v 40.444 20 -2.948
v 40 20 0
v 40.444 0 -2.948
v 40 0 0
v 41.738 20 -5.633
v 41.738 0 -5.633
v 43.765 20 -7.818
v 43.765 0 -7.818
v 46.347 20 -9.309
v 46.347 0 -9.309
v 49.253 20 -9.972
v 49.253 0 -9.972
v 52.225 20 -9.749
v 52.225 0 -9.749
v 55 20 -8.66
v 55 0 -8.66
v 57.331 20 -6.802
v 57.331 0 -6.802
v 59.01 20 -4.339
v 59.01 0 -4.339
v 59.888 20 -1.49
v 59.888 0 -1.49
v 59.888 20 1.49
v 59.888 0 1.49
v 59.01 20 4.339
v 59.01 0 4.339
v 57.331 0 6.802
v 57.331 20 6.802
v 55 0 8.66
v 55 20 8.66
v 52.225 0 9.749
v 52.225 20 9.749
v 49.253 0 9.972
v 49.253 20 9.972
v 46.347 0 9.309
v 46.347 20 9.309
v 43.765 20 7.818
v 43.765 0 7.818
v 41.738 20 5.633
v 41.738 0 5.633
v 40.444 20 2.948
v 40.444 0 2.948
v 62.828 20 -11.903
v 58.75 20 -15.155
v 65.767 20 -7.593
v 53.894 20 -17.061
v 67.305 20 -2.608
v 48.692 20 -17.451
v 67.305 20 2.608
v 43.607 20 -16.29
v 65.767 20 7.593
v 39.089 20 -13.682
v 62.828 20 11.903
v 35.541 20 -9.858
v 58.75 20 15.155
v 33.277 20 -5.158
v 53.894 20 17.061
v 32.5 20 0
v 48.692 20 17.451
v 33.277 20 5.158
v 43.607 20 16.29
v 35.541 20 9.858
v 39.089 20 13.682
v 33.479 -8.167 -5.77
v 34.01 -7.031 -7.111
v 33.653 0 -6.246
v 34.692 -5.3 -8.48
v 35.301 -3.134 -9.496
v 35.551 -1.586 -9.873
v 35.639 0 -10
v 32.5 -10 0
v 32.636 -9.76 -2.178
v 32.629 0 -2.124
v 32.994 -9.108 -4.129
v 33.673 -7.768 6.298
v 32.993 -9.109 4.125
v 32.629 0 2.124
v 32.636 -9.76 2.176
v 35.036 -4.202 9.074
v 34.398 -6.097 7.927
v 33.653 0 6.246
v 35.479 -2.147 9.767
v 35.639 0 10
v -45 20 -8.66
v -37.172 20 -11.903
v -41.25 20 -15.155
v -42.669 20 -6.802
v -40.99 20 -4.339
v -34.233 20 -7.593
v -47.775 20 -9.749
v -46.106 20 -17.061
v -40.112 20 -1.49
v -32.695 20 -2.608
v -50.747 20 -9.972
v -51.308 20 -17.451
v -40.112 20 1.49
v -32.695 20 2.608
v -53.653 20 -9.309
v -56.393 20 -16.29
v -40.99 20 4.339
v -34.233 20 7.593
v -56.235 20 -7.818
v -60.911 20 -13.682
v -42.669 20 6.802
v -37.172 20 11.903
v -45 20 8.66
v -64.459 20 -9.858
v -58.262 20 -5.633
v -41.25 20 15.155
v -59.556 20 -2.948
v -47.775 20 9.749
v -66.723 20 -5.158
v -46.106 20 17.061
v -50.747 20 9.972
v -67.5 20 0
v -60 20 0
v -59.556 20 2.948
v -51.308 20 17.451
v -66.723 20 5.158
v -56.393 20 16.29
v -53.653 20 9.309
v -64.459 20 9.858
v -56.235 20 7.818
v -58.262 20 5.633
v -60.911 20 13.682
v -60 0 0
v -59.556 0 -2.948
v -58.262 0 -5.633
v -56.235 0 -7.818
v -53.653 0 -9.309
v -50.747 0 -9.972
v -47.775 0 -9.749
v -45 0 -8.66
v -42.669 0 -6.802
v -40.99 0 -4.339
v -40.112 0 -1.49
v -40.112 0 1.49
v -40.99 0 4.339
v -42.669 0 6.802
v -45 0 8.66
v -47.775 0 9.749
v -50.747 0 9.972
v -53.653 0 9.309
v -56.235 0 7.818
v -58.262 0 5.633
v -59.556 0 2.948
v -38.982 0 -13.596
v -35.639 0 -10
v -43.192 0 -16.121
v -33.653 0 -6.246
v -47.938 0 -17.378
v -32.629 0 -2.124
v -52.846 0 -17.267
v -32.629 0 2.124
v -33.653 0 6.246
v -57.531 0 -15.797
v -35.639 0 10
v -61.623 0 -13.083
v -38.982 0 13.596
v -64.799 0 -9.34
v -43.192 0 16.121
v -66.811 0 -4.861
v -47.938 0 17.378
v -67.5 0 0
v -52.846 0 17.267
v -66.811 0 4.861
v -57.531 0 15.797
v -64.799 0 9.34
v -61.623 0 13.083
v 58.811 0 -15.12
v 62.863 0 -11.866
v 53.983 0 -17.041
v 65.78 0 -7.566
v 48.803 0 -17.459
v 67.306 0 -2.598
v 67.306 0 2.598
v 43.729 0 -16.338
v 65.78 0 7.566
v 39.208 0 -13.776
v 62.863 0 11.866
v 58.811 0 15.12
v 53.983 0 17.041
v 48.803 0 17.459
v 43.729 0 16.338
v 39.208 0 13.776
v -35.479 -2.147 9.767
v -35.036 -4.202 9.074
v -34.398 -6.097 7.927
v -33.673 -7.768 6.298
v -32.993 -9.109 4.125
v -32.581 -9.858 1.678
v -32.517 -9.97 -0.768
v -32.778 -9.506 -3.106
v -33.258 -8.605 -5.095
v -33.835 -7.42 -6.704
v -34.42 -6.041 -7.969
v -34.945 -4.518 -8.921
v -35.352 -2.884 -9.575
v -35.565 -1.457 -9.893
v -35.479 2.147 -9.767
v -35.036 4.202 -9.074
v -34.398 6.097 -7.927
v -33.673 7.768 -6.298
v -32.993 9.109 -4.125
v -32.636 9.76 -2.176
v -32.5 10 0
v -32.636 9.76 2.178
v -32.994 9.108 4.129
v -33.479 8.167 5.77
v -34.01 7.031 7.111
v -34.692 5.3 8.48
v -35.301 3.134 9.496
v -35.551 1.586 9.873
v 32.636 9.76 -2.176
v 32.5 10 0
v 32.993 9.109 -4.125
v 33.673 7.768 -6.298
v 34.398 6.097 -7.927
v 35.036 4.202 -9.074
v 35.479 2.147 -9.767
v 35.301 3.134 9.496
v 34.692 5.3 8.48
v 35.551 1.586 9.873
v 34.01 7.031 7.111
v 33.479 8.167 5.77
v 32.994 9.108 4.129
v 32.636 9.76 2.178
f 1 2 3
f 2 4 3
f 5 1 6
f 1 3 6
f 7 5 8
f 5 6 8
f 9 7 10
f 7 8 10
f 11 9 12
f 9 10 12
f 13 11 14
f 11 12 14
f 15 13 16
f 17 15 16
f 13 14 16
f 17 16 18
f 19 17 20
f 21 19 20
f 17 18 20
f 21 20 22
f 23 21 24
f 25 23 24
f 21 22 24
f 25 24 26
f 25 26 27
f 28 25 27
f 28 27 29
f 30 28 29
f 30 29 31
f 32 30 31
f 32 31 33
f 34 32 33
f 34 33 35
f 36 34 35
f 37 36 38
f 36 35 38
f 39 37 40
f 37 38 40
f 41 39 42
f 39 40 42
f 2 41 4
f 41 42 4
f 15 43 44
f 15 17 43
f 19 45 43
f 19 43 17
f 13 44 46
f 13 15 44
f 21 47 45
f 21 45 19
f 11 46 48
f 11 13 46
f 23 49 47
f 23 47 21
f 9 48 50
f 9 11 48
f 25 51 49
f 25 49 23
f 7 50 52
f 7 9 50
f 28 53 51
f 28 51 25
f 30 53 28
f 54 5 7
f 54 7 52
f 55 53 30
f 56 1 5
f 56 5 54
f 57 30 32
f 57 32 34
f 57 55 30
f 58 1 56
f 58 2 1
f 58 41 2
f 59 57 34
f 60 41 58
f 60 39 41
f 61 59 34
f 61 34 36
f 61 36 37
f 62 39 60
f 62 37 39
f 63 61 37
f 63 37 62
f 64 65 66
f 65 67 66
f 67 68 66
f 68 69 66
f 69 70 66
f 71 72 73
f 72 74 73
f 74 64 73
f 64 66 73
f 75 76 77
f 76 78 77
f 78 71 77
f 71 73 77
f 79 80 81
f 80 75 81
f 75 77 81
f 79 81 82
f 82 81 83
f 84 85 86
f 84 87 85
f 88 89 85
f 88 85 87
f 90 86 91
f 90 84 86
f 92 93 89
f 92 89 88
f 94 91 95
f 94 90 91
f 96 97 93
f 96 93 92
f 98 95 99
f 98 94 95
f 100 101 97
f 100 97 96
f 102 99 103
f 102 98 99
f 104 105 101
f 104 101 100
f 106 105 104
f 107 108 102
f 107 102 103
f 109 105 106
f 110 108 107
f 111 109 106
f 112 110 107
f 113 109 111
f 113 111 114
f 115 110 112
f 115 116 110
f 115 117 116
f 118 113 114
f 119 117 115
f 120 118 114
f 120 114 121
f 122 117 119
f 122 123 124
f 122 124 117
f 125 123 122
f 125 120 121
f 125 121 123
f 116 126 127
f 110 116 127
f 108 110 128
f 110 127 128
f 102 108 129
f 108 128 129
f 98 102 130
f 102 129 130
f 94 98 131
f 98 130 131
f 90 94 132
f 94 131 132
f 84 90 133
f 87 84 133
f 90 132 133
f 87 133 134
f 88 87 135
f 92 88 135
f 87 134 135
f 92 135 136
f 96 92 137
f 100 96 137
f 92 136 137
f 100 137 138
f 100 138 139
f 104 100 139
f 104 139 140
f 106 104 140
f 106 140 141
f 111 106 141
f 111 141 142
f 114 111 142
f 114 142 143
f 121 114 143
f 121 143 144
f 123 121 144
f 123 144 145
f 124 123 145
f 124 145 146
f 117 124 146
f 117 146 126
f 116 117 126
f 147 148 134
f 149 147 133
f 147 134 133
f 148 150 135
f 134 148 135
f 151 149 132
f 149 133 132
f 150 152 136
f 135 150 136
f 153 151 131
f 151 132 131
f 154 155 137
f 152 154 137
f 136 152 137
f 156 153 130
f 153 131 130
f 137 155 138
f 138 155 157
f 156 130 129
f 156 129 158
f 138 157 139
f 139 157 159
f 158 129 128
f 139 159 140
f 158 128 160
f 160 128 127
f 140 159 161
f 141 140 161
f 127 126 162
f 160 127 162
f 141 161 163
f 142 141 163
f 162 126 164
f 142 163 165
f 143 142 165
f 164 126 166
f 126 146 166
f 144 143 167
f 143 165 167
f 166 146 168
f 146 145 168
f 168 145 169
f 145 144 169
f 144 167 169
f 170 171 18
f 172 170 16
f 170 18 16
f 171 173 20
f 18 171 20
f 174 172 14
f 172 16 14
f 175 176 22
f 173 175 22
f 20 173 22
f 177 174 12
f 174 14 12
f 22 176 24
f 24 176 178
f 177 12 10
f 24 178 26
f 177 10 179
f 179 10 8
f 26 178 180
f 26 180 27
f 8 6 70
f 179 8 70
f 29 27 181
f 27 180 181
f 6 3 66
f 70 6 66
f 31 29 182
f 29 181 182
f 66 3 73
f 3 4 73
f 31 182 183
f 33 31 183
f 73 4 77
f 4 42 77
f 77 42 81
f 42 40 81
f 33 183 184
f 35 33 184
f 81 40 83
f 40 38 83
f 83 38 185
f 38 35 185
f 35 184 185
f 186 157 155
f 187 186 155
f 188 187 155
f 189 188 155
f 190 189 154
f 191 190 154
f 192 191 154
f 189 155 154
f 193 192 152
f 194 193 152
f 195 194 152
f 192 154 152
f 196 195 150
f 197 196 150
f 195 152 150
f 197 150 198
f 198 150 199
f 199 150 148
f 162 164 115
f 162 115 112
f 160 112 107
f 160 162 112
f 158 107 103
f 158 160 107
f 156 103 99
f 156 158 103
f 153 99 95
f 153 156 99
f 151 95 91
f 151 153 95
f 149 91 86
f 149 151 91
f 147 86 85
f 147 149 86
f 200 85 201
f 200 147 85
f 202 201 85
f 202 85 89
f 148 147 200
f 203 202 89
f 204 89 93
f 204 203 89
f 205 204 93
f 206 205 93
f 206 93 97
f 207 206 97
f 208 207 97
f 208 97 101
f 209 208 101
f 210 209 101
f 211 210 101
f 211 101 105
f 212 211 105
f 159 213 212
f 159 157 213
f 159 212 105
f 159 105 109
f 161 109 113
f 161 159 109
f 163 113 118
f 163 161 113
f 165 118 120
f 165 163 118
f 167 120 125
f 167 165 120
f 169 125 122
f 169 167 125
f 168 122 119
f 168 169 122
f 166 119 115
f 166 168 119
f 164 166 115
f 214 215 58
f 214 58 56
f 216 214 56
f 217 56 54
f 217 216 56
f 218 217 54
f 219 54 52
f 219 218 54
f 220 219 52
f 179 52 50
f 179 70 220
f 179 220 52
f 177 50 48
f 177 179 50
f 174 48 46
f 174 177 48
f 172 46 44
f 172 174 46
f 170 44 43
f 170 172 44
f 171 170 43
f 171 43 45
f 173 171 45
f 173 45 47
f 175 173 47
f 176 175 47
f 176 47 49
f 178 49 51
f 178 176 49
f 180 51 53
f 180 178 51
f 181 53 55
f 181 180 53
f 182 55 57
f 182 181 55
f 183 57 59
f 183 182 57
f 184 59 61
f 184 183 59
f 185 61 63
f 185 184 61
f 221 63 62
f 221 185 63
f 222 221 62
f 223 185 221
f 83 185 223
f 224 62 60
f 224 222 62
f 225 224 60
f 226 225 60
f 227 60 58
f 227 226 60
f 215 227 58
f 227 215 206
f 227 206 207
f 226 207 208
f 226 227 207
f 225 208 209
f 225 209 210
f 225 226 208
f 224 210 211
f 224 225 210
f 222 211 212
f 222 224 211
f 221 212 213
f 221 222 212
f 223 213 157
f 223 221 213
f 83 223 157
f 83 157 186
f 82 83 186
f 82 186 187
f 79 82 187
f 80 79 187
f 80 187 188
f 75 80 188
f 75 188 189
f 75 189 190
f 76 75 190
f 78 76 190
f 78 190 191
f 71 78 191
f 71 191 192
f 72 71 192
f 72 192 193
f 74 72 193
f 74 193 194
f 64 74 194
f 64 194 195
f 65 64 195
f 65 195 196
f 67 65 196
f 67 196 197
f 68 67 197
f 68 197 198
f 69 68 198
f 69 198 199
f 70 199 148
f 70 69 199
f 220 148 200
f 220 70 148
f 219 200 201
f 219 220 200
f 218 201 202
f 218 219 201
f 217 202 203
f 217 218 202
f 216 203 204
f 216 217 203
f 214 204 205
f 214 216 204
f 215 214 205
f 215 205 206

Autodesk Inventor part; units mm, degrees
ref_plane "YZ Plane" through (0, 0, 0) normal (1, 0, 0) x (0, 1, 0)
ref_plane "XZ Plane" through (0, 0, 0) normal (0, 1, 0) x (-1, 0, 0)
ref_plane "XY Plane" through (0, 0, 0) normal (0, 0, 1) x (1, 0, 0)
sketch "Sketch1" plane through (0, 0, 0) normal (0, 0, 1) x (1, 0, 0)
  line L0 (-50, 0) -> (50, 0)
  line L1 (0, 0) -> (0, 34.9563) construction
  line L2 (-50, 0) -> (-50, 10)
  line L3 (-50, 10) -> (50, 10)
  line L4 (50, 10) -> (50, 0)
  dimension "d0" = 100
  dimension "d1" = 10
revolve "Revolution1" add sketch "Sketch1" angle 360 about axis through (-50, 0, 0) along (1, 0, 0)
sketch "Sketch2" plane through (0, 0, 0) normal (0, 1, 0) x (-1, 0, 0)
  line L0 (-50, 10) -> (-50, -10) projected
  circle A0 centre (-50, 0) radius 17.5
  circle A1 centre (-50, 0) radius 10
  point P0 (0, 0)
  dimension "d3" = 35
  dimension "d4" = 20
extrude "Extrusion1" add sketch "Sketch2" along normal blind 20
extrude "Extrusion2" cut sketch "Sketch2" against normal blind 20 contours A1 L0 | A0 picked at (-47.9217, -2.6061)
extrude "Extrusion3" cut sketch "Sketch2" along normal blind 20 contours A1 L0 picked at (-47.9217, -2.6061)
sketch "Sketch4" plane through (0, 0, 0) normal (0, 1, 0) x (-1, 0, 0)
  line L0 (50, 10) -> (50, -10) projected
  circle A0 centre (50, 0) radius 17.5
  circle A1 centre (50, 0) radius 10
  point P0 (0, 0)
  dimension "d17" = 35
  dimension "d18" = 20
extrude "Extrusion6" add sketch "Sketch4" along normal blind 20
extrude "Extrusion7" cut sketch "Sketch4" against normal blind 20 contours L0 A1 | A0 picked at (46.9919, -2.3982)
extrude "Extrusion8" cut sketch "Sketch4" along normal blind 20 contours L0 A1 picked at (46.9919, -2.3982)
